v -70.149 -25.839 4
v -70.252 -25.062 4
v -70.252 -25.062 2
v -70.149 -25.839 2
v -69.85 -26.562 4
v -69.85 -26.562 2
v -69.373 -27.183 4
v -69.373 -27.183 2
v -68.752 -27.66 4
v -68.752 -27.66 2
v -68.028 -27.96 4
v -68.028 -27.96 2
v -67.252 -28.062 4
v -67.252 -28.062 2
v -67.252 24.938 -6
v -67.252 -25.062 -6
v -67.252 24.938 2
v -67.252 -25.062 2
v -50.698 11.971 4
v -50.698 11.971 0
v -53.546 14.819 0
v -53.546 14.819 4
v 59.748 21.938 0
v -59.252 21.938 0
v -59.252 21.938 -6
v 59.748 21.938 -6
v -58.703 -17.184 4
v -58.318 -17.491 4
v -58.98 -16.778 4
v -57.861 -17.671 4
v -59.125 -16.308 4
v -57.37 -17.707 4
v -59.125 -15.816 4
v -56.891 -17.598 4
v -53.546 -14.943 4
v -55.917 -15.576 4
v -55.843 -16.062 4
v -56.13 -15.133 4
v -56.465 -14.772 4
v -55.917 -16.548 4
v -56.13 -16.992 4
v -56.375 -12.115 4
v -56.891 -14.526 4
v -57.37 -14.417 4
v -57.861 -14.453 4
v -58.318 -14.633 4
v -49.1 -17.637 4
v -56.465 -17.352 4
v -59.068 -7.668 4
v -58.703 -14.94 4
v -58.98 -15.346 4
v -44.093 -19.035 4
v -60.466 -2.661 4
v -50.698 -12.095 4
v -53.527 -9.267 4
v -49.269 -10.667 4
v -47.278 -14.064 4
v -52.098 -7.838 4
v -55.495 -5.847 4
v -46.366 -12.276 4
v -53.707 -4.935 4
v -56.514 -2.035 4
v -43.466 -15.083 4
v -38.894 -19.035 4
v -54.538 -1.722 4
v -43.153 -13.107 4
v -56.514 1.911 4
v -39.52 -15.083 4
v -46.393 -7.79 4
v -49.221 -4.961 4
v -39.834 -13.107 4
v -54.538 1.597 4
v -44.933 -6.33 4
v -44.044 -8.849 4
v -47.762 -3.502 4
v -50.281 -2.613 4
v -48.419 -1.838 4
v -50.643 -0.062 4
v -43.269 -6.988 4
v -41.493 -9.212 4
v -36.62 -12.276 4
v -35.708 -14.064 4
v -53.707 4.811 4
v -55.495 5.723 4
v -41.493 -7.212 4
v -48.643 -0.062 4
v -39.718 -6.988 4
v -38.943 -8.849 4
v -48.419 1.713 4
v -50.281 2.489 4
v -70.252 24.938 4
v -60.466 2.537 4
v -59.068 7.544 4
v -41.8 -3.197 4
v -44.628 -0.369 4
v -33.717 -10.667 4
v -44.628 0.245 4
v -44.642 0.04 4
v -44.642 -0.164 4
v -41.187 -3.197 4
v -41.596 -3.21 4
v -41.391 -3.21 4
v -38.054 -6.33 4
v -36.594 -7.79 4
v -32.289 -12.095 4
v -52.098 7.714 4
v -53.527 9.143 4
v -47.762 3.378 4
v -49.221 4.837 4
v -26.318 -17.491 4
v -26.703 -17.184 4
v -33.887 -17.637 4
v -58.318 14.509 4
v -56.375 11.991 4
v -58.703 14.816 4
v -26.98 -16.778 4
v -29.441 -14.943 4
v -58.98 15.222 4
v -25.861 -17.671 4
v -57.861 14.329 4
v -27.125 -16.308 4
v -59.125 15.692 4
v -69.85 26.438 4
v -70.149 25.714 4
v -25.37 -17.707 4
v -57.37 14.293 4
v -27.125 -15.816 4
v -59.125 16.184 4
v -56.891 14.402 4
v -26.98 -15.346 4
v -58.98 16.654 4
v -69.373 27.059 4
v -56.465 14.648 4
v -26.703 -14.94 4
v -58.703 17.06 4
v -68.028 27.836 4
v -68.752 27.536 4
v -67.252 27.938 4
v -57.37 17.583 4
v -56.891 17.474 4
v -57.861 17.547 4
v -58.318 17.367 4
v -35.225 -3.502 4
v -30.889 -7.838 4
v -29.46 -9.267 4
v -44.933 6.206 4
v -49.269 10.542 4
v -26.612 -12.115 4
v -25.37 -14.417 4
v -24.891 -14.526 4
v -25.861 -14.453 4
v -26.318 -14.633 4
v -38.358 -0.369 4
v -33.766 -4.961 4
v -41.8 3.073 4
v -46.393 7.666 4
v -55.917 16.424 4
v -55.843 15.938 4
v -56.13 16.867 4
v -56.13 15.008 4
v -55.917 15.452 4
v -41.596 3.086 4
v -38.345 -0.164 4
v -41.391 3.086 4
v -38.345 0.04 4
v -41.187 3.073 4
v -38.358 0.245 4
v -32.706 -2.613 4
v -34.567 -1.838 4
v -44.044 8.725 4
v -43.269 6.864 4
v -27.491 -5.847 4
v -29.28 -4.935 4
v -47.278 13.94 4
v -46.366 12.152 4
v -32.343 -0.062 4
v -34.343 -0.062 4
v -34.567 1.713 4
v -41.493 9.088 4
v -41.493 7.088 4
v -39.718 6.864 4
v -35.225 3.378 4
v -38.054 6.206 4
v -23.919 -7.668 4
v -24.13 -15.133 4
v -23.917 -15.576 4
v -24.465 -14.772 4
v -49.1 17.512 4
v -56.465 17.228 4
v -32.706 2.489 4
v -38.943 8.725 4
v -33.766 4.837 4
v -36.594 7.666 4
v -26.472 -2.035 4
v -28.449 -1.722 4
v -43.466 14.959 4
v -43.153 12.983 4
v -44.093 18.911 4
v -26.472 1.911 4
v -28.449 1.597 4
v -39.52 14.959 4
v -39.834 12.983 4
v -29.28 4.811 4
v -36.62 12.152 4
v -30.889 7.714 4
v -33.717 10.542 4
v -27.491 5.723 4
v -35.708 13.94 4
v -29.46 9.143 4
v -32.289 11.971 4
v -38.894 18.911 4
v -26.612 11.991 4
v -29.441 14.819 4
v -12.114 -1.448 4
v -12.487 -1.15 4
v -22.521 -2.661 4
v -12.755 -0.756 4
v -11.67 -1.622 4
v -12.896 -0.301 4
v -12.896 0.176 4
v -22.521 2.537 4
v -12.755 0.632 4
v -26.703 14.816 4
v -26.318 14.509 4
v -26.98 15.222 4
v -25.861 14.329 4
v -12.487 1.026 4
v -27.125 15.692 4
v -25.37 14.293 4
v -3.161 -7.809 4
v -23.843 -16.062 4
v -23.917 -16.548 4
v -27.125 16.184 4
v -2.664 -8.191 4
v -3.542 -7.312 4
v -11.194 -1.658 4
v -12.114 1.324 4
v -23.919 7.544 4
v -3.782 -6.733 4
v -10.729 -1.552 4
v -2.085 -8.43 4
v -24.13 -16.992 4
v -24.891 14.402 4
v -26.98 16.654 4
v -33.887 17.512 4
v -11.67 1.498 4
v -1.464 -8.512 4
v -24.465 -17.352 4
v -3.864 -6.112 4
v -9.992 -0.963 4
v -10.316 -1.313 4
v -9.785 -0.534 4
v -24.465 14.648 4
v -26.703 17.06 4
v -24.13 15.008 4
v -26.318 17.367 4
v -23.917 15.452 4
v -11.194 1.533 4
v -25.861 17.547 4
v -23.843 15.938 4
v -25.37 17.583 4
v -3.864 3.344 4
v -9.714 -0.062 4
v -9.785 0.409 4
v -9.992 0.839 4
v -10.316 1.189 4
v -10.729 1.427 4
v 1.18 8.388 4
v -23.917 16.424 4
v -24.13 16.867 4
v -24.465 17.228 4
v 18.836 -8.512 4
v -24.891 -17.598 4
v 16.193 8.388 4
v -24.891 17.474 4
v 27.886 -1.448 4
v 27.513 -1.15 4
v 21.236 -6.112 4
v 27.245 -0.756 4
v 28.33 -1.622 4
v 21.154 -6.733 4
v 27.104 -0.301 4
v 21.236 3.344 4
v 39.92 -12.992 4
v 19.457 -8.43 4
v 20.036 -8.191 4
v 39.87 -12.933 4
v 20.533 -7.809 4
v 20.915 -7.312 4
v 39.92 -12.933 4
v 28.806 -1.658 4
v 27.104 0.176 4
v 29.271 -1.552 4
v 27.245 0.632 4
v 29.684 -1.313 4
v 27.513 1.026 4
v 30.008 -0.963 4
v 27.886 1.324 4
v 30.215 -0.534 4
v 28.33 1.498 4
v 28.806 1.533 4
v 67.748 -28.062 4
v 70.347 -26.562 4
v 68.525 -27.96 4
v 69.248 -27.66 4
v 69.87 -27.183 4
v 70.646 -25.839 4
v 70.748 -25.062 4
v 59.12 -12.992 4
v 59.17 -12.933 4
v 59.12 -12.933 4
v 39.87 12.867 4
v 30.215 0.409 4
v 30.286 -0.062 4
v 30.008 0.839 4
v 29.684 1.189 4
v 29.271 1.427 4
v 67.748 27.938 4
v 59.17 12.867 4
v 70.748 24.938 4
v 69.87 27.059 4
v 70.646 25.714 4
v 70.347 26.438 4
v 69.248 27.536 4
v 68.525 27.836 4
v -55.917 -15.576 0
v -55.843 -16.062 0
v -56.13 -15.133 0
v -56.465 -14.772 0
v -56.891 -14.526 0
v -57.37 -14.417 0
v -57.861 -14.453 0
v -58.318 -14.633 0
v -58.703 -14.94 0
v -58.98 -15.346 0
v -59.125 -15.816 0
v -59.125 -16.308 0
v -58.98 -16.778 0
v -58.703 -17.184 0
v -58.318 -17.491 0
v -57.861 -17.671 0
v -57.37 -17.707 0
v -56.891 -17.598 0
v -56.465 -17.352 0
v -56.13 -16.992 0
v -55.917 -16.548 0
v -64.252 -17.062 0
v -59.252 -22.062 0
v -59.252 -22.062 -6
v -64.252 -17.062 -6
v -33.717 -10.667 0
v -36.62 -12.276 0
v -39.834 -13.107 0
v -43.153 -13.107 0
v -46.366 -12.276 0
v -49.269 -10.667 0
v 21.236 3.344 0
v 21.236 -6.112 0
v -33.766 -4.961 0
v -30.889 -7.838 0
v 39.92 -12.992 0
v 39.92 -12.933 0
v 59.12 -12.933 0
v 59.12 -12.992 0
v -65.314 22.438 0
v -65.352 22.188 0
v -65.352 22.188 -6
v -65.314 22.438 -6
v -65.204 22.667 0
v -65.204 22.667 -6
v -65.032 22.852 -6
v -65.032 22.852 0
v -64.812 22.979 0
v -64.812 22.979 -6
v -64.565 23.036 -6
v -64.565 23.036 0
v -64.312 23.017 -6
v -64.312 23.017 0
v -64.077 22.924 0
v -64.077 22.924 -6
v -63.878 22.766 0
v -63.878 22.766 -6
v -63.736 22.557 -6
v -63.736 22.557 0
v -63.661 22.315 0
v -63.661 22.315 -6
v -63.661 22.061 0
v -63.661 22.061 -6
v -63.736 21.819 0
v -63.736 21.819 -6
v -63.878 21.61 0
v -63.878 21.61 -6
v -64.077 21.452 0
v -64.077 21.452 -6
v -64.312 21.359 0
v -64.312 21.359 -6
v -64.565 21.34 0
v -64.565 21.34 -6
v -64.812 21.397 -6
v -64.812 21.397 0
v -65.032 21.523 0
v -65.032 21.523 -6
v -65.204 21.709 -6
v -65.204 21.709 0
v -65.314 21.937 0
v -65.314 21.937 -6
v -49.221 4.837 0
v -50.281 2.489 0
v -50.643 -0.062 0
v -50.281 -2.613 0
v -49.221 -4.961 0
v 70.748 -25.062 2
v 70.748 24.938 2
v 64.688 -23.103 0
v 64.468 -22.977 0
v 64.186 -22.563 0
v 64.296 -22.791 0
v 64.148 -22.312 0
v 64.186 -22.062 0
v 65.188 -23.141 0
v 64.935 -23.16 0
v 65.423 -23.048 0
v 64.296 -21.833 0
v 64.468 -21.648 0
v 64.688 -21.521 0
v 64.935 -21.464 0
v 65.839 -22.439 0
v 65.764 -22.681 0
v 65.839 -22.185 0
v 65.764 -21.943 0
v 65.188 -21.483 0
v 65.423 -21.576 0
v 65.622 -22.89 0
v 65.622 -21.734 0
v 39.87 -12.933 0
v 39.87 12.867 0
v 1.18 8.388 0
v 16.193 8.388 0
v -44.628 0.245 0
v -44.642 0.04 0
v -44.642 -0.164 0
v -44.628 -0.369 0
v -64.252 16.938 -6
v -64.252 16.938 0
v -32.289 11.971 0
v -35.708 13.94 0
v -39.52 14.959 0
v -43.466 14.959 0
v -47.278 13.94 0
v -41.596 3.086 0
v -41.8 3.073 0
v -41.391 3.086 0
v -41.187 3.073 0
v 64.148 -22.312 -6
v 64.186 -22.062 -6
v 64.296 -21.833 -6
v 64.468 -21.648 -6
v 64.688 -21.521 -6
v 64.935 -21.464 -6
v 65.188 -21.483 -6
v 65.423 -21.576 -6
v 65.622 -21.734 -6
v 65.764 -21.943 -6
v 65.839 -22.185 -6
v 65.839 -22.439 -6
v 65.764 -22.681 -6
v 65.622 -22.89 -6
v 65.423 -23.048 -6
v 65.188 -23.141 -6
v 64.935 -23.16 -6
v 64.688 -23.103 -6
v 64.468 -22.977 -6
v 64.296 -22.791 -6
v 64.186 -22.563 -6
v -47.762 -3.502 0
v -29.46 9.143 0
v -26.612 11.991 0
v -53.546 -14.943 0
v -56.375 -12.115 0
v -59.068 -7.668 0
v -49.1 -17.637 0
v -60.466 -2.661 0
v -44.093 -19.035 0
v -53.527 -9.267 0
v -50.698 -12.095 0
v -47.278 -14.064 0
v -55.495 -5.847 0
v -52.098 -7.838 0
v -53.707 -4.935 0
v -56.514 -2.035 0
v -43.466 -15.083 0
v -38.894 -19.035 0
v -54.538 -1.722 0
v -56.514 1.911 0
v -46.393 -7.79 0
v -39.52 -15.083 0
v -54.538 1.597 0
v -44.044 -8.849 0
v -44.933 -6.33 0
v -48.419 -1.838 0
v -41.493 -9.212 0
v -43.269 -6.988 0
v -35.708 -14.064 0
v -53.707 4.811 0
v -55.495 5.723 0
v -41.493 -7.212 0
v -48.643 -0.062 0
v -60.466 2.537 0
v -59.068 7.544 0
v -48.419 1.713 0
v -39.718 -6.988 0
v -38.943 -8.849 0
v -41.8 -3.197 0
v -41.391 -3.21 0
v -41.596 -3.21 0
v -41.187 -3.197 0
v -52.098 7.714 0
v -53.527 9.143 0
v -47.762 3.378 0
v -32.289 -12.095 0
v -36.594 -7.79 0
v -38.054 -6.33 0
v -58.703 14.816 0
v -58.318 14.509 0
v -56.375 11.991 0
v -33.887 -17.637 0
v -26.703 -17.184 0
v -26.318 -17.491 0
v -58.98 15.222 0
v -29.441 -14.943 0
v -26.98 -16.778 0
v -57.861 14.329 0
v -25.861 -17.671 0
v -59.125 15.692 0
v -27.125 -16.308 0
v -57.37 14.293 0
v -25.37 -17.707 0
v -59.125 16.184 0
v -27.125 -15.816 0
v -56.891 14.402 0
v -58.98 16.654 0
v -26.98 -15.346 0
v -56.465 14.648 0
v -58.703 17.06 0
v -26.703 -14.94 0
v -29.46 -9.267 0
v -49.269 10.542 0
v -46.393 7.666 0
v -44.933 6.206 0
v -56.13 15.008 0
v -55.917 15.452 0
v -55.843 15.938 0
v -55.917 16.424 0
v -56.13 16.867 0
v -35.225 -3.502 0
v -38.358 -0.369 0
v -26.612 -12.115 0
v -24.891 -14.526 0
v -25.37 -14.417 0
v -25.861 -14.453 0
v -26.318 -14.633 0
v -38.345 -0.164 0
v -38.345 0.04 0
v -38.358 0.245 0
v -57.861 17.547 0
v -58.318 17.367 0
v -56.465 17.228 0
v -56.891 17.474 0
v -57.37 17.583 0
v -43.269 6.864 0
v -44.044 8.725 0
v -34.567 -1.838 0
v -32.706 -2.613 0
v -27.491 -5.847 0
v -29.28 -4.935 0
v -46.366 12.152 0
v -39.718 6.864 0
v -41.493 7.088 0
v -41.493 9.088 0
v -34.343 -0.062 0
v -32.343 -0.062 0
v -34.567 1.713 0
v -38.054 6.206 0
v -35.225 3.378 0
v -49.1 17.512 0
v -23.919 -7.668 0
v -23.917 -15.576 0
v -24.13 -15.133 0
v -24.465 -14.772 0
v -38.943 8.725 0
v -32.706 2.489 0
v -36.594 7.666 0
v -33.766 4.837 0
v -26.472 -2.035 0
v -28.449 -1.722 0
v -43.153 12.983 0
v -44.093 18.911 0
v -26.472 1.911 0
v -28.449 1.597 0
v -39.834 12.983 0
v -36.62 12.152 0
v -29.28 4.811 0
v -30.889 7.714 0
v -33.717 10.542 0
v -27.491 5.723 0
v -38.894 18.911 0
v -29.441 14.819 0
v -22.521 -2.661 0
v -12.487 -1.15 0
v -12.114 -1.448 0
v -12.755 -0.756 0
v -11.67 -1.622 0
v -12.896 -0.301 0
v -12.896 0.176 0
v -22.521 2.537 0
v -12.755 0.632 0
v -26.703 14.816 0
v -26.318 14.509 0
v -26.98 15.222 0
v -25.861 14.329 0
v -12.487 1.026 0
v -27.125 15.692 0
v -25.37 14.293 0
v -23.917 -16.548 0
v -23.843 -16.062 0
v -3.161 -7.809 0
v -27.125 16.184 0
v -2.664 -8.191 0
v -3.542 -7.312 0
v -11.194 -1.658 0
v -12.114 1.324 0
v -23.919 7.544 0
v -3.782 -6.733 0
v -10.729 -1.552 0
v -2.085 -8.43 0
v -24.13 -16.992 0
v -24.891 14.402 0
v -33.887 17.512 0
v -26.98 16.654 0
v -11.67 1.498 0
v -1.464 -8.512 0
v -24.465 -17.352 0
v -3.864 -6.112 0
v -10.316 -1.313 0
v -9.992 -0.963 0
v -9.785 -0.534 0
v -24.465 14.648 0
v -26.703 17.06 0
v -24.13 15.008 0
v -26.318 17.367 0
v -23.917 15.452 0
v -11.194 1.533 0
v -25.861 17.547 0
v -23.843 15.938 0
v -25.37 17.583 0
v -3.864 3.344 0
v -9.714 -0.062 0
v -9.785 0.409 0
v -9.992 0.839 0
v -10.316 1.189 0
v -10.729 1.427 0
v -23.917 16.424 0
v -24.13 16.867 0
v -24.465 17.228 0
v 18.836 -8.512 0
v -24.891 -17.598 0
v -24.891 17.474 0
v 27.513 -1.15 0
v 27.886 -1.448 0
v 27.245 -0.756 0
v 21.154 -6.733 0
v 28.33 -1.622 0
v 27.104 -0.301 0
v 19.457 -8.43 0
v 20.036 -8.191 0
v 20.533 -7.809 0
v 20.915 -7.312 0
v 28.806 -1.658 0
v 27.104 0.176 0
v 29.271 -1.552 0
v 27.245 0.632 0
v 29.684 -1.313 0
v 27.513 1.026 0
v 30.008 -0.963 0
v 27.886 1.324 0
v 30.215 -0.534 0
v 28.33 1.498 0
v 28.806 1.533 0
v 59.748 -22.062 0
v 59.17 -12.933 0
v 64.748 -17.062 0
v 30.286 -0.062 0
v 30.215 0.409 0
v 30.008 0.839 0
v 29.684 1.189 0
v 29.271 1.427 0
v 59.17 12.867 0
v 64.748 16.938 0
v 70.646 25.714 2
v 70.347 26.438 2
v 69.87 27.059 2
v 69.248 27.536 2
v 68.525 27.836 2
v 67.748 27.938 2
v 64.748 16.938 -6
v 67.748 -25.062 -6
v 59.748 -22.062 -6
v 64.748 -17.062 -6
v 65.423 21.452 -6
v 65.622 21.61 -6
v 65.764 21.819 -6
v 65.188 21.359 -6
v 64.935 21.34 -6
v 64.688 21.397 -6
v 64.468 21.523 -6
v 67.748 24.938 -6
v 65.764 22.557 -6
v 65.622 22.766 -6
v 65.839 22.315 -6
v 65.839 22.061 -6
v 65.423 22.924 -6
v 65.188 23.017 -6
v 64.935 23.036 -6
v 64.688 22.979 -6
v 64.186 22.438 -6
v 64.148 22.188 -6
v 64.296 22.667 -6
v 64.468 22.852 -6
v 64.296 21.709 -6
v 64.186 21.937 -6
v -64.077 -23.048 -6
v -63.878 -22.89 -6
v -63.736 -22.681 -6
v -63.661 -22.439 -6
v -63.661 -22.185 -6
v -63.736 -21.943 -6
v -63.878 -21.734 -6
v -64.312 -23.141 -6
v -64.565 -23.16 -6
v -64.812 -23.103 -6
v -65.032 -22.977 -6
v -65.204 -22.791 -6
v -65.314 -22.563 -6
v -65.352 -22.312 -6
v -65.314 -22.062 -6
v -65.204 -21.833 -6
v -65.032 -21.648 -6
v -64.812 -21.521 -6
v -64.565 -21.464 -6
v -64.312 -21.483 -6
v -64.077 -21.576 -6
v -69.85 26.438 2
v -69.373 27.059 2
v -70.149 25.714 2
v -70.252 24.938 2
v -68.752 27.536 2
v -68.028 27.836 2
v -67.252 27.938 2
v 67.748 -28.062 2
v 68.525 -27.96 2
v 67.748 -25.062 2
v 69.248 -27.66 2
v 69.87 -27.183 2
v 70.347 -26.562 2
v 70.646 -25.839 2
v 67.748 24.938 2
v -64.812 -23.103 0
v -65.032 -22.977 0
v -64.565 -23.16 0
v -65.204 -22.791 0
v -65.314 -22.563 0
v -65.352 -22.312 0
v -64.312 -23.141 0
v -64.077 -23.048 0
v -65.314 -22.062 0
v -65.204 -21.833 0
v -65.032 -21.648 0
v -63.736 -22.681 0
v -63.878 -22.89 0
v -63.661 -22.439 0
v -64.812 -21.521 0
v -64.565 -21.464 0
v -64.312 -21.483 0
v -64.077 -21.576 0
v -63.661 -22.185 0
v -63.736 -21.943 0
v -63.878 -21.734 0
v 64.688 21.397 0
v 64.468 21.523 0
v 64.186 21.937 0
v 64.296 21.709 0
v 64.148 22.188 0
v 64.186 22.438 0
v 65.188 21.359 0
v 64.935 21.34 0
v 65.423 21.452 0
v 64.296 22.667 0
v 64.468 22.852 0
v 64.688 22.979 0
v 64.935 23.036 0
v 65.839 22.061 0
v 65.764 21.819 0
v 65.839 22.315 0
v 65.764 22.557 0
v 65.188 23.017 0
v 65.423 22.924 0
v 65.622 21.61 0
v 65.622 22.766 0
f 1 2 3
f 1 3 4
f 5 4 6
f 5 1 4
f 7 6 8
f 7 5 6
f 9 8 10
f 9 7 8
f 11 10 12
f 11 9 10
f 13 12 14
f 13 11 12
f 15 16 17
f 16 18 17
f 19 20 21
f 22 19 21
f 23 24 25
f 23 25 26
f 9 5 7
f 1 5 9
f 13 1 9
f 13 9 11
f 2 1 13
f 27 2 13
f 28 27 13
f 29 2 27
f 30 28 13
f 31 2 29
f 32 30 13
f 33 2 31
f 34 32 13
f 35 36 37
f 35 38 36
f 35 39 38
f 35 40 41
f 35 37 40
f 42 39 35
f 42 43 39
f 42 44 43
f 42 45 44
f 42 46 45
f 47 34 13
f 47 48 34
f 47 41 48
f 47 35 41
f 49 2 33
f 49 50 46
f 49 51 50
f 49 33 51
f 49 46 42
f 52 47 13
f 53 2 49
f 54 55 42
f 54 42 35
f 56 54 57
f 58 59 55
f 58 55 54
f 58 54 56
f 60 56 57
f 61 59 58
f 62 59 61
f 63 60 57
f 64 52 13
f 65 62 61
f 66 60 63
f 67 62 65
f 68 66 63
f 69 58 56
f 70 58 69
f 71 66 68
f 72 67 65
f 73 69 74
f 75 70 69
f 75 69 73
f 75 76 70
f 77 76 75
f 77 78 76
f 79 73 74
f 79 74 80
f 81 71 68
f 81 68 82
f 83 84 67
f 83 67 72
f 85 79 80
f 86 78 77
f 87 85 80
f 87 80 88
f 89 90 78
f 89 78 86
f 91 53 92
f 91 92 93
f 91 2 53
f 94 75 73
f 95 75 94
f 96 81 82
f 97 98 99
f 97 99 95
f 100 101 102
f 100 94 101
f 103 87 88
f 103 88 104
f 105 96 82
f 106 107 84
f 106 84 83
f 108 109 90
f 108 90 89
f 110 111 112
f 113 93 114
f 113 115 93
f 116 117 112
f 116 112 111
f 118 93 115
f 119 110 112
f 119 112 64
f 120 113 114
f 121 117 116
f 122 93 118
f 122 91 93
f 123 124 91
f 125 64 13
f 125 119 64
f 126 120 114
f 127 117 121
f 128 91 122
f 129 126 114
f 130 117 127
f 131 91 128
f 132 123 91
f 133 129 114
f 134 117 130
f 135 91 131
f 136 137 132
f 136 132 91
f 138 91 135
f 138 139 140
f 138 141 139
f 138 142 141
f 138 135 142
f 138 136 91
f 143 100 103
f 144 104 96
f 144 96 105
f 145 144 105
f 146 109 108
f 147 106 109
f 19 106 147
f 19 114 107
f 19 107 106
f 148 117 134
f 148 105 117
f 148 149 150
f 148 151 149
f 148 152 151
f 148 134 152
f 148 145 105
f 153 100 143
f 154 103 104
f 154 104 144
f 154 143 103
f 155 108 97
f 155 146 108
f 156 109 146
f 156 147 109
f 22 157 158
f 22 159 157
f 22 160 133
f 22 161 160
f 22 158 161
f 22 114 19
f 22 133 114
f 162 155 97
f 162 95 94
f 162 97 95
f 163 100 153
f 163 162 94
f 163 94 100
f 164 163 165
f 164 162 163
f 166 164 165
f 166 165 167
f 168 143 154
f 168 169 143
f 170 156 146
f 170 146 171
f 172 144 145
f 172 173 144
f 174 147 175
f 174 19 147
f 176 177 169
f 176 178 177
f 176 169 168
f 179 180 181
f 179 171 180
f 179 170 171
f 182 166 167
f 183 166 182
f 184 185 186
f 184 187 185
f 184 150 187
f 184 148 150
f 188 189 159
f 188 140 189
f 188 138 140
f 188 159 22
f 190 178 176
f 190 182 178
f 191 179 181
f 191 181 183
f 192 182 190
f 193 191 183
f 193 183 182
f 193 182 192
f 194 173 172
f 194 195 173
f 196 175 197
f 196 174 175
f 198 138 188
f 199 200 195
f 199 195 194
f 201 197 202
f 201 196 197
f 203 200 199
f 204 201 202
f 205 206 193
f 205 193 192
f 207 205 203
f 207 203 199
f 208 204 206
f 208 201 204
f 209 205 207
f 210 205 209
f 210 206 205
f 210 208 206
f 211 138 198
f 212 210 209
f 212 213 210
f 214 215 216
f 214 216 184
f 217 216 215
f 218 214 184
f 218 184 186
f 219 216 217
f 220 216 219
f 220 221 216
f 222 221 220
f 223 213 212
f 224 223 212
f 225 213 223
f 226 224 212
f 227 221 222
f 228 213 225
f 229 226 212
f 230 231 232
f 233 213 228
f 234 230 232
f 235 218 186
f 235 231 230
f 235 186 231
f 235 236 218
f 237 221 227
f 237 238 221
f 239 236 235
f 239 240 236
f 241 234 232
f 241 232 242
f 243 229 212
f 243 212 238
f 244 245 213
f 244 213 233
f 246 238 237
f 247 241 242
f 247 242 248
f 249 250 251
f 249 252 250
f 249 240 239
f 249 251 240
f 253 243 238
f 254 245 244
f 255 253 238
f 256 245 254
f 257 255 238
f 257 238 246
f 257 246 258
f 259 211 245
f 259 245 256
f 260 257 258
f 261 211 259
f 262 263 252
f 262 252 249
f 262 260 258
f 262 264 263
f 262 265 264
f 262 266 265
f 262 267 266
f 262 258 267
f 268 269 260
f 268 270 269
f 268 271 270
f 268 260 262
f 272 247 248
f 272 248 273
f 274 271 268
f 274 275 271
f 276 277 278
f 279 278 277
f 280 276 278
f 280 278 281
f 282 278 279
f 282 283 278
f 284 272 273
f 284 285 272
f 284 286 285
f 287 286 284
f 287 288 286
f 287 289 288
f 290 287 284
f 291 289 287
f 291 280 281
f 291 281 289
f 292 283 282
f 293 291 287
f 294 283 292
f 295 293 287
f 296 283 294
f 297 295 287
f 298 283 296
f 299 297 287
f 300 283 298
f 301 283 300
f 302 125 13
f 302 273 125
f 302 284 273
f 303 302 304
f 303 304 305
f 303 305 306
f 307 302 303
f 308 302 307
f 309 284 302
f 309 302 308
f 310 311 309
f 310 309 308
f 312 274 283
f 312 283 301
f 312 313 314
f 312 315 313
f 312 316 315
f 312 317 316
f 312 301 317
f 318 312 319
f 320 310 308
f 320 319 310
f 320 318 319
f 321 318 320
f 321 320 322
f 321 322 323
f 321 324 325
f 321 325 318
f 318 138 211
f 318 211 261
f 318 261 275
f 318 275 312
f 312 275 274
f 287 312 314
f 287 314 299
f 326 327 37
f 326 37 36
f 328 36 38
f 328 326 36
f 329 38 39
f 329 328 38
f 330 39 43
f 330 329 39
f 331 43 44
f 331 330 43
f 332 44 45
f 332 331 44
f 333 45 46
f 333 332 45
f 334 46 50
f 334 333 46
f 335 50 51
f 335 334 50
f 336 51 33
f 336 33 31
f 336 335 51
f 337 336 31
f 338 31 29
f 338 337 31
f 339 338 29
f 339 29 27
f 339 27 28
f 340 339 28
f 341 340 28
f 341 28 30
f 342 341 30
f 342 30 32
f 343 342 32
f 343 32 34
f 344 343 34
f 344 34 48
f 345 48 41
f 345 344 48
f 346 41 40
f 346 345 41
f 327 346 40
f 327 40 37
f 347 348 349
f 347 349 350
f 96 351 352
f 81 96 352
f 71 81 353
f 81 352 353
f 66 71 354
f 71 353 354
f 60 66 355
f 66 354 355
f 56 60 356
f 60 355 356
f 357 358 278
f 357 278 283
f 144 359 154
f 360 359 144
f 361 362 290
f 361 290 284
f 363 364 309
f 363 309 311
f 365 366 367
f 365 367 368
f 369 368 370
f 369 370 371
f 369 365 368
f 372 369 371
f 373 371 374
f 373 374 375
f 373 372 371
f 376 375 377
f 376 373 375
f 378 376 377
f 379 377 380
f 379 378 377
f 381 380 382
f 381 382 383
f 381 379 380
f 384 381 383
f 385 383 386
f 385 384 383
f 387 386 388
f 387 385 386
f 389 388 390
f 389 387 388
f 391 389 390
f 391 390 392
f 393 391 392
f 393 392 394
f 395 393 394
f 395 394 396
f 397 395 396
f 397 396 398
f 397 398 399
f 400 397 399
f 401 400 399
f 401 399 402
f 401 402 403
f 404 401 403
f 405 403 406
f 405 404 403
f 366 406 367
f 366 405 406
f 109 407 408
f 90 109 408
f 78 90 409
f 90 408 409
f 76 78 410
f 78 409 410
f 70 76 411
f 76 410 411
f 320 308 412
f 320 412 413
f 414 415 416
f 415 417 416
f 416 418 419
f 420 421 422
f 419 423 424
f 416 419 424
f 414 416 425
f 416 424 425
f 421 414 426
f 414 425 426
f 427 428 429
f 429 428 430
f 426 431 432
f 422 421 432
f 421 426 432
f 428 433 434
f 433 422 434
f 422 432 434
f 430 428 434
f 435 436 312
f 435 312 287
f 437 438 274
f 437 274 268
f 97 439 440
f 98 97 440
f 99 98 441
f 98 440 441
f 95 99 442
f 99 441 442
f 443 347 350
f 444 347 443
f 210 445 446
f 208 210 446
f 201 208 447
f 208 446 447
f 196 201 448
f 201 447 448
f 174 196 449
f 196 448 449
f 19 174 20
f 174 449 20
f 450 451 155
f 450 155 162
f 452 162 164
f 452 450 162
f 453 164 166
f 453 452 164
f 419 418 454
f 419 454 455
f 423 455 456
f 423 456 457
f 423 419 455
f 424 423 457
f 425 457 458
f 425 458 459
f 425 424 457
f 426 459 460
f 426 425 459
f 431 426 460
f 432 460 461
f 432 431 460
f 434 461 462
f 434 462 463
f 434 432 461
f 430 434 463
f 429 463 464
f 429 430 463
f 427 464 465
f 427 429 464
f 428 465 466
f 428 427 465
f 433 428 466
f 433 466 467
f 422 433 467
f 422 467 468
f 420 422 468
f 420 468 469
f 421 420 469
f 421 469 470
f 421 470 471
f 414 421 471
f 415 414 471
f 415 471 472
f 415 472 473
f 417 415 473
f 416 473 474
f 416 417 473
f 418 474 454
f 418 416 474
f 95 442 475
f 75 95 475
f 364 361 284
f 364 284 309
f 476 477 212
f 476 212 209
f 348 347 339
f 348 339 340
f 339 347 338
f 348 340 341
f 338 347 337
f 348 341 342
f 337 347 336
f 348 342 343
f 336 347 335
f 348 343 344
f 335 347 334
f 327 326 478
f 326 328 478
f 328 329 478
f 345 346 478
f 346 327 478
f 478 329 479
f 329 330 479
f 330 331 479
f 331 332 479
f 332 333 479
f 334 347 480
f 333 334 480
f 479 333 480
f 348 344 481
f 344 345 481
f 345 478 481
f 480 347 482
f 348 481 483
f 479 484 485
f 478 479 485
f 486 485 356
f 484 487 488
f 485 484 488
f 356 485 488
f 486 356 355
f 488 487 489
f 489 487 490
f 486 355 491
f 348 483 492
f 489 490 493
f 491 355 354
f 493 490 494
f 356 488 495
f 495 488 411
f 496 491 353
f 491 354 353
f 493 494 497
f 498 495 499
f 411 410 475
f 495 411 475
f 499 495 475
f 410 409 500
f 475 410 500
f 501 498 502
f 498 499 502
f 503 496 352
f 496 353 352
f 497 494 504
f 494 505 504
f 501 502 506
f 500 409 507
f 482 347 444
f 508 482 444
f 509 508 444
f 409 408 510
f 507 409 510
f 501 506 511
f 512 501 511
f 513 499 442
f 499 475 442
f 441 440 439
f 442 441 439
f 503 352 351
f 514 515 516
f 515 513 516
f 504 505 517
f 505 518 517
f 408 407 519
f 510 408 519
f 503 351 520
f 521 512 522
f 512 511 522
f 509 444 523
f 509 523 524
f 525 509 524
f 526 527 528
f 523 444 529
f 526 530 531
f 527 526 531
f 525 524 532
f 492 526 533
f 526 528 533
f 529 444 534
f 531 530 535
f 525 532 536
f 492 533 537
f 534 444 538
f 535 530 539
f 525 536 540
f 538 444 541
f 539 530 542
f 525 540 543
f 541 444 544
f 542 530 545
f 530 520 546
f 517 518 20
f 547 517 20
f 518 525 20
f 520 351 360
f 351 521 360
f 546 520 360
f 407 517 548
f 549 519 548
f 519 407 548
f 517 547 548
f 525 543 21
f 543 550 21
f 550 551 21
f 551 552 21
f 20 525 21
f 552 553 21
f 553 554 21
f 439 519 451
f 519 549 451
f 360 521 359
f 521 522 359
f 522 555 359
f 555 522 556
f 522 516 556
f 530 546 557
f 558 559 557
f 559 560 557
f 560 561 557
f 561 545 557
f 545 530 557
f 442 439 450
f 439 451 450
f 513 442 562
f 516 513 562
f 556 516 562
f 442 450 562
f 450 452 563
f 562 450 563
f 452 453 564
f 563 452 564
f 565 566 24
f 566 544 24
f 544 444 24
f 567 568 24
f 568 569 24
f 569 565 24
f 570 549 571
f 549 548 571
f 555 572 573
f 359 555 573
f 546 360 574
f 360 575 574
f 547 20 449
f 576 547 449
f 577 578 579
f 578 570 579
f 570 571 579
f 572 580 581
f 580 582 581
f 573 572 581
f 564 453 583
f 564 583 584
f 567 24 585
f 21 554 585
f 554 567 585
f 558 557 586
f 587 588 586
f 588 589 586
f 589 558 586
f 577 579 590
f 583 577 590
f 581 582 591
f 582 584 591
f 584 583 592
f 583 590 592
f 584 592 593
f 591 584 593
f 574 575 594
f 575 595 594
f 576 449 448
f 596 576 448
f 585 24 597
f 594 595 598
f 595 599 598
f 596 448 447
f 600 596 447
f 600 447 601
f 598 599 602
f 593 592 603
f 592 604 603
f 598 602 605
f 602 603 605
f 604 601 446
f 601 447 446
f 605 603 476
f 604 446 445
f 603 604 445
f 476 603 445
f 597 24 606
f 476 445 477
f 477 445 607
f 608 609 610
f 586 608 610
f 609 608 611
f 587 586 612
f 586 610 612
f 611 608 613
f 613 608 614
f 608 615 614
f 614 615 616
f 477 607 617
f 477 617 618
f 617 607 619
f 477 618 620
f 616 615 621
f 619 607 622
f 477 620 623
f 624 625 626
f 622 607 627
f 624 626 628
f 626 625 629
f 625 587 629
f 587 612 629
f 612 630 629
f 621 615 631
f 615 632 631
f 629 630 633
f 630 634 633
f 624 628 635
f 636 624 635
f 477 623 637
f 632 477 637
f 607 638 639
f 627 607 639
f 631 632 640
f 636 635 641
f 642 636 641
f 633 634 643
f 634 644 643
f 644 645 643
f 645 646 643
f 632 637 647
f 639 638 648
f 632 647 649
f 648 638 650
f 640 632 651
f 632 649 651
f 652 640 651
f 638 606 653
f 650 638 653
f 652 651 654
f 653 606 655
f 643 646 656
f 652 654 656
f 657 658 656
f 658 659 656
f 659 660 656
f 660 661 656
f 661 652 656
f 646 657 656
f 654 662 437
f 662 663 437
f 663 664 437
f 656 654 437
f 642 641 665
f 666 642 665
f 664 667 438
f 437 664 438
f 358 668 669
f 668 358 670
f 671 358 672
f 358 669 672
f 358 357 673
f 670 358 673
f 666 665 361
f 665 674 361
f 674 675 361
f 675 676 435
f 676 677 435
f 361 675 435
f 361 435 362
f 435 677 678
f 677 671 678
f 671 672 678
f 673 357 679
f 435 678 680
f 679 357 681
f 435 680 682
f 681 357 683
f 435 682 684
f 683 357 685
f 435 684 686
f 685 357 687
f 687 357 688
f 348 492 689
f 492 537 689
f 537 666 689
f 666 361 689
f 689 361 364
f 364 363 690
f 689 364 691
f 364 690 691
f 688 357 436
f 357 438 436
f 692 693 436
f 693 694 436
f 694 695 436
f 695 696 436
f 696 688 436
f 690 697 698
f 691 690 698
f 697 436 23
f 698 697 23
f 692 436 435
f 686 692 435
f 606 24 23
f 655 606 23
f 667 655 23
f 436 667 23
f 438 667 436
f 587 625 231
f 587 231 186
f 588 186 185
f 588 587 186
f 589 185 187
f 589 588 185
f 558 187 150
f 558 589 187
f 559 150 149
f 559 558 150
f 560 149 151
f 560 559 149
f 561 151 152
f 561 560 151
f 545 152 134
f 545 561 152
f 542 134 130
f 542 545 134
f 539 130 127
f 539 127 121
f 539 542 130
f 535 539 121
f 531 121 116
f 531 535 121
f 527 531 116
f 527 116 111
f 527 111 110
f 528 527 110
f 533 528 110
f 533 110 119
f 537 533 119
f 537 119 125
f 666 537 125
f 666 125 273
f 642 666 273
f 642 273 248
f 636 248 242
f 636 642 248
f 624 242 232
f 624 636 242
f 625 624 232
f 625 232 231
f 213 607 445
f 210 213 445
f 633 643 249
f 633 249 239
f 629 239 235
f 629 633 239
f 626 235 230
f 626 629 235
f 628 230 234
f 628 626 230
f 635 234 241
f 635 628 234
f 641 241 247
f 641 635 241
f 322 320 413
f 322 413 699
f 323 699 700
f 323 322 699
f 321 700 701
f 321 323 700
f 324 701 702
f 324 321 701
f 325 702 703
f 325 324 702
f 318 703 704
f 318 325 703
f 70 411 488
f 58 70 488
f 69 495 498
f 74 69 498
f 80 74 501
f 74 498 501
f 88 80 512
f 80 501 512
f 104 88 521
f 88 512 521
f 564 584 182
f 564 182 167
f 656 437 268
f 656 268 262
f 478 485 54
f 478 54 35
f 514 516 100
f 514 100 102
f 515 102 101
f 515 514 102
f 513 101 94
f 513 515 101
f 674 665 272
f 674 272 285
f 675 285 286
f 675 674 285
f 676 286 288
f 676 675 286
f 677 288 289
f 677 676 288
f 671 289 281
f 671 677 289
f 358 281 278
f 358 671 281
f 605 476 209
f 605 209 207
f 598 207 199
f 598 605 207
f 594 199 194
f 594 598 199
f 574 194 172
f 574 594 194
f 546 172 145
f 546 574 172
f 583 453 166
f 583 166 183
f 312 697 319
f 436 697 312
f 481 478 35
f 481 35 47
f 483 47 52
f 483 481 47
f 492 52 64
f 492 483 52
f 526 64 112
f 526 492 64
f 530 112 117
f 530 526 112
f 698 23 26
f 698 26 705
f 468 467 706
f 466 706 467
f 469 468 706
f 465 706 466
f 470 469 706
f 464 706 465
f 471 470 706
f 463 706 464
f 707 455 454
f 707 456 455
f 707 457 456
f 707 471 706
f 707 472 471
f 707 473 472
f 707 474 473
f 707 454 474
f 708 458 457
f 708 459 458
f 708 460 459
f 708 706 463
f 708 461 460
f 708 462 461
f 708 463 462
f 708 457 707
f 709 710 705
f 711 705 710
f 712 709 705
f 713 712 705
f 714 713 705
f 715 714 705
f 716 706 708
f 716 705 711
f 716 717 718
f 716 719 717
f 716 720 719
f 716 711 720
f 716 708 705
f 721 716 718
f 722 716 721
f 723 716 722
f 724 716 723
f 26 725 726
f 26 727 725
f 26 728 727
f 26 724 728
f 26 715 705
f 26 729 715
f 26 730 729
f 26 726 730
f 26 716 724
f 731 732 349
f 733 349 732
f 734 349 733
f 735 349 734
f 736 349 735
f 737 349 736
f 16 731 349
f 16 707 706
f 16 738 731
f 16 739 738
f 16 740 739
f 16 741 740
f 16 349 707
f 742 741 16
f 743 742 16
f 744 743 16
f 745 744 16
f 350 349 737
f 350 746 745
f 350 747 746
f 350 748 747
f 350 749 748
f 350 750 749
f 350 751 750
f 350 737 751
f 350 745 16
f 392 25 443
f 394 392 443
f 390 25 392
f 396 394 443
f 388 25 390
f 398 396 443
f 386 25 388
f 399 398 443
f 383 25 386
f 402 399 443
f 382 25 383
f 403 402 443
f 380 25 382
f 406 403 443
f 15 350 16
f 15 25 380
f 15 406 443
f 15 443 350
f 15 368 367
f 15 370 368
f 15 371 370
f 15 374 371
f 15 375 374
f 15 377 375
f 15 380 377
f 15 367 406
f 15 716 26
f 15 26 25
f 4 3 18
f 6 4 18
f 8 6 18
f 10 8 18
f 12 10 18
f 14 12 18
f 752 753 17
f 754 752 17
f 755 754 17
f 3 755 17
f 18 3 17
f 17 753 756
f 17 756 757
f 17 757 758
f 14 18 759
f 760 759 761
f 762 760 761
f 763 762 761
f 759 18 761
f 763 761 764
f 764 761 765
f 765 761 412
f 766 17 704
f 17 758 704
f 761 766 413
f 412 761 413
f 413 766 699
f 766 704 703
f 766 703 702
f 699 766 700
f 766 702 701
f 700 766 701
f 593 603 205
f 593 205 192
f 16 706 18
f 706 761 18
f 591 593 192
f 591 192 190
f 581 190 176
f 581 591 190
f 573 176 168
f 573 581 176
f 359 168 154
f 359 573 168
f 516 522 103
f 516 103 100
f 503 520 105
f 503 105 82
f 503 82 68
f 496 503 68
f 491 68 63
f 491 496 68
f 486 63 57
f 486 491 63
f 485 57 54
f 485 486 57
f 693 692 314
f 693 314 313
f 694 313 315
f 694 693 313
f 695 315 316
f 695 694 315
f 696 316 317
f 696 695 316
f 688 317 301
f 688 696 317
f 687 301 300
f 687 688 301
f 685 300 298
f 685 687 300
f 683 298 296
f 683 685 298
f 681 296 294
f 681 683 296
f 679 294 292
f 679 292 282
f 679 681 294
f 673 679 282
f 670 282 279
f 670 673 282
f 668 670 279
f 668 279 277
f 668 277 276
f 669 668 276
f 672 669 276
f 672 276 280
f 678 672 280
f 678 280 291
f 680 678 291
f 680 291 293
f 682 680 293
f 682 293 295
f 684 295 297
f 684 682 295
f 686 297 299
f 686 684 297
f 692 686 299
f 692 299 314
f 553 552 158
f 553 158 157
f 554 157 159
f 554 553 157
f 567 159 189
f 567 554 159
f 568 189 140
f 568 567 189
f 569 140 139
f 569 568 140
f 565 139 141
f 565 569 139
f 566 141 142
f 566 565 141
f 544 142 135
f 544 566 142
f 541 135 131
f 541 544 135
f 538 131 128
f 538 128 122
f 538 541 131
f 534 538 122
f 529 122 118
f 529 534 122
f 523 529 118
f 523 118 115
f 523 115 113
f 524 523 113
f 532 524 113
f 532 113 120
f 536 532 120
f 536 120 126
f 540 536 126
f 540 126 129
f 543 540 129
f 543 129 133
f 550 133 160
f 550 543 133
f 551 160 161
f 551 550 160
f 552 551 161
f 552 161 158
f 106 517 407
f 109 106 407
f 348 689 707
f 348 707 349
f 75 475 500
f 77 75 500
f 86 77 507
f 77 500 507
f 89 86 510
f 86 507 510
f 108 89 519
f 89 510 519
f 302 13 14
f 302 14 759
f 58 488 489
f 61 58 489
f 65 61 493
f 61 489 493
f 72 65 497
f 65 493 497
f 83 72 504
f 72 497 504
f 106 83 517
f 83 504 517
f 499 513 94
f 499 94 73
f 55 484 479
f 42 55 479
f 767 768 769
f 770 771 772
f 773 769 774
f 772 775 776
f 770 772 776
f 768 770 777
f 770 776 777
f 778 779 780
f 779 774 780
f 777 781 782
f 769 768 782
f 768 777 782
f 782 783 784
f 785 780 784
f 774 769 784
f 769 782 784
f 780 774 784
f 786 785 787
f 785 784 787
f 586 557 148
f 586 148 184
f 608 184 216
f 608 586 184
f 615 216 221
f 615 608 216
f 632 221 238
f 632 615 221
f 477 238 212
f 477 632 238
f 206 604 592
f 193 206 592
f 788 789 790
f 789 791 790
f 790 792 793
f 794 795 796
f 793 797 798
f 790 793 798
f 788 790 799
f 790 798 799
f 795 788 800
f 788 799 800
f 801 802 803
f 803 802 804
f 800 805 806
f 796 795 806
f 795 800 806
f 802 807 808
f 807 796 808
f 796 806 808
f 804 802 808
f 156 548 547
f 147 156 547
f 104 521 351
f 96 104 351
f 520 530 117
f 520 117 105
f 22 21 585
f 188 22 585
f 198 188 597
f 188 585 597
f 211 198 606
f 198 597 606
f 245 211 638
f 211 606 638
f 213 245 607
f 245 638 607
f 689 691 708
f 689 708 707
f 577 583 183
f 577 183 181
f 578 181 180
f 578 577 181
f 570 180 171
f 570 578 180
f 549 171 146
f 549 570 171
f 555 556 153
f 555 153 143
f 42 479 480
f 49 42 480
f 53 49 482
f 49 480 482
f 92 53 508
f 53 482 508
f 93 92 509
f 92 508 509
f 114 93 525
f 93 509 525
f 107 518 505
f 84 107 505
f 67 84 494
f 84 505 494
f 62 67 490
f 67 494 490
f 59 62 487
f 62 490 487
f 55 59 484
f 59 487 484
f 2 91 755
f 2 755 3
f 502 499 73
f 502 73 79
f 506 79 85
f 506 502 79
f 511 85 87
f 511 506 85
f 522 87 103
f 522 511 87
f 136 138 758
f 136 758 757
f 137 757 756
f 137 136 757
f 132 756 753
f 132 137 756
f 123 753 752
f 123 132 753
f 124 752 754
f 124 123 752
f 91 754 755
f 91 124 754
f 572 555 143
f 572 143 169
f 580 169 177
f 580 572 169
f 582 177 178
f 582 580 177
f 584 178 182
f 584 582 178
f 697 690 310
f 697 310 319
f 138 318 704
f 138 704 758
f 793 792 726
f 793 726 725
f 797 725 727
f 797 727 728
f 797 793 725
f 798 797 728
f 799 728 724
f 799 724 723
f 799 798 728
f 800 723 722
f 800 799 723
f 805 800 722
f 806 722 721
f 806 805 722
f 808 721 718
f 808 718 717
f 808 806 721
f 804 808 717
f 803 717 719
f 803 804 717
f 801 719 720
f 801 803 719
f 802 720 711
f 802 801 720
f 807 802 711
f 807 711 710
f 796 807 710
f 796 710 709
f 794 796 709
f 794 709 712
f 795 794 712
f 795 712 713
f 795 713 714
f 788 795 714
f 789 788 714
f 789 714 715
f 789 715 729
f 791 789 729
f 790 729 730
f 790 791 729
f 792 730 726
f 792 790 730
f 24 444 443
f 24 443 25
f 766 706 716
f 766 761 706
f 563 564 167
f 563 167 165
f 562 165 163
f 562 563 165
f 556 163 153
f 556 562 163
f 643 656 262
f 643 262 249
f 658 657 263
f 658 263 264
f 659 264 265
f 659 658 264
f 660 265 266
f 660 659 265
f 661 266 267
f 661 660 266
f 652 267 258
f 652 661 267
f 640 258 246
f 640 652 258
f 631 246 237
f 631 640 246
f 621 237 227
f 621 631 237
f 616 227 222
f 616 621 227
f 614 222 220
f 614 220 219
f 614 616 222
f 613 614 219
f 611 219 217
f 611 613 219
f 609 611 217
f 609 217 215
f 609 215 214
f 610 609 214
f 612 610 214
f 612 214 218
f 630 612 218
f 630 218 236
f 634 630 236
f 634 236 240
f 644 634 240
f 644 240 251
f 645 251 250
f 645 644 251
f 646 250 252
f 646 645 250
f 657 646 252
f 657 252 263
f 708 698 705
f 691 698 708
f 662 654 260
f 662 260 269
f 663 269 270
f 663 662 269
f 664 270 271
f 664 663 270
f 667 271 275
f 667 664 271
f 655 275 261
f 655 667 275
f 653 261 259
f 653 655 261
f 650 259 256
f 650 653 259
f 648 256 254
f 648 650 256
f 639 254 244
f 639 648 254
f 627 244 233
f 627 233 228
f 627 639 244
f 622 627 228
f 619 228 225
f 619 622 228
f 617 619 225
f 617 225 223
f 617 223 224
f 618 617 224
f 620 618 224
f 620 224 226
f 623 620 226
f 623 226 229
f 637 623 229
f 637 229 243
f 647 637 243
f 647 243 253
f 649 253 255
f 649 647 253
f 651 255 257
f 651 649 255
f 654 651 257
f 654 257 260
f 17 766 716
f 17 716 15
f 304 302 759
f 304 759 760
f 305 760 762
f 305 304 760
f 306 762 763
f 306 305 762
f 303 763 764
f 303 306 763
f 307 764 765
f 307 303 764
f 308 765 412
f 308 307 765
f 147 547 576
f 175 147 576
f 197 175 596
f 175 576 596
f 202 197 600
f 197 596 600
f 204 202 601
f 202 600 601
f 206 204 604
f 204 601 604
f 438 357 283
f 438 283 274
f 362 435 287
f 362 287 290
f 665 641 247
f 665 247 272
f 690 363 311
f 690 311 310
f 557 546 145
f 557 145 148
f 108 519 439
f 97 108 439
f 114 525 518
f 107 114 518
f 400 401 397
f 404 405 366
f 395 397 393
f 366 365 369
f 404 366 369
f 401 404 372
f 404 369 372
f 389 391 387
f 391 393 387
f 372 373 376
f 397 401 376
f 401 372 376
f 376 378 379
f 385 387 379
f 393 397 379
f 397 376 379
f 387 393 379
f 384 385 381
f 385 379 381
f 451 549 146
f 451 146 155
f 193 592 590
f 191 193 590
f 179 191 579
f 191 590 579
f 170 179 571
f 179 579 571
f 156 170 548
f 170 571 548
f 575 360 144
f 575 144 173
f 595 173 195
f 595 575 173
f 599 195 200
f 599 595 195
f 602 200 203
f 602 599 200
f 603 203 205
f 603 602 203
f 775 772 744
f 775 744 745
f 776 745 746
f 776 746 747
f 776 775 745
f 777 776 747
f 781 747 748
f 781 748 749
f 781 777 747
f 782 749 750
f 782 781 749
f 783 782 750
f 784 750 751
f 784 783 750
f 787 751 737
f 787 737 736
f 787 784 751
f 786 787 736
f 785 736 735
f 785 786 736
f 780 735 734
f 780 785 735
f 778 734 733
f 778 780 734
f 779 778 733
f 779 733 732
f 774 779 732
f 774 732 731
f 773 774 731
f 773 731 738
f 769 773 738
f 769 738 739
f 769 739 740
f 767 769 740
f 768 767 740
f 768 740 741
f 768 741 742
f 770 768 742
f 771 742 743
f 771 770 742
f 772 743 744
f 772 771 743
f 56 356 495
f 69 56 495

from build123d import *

# Parameters (mm, degrees)
CROQUIS1_W              = 135
CROQUIS1_H              = 50
CROQUIS1_R              = 1.65
CROQUIS1_R_2            = 1.6
SALIENTE_EXTRUIR1_DEPTH = 4
CROQUIS2_W              = 135
CROQUIS2_H              = 50
SALIENTE_EXTRUIR2_DEPTH = 2
CROQUIS3_W              = 135
CROQUIS3_H              = 50
CROQUIS3_R              = 0.85
SALIENTE_EXTRUIR3_DEPTH = 6


with BuildPart() as part:
    # Croquis1 → Saliente-Extruir1 (new body)
    with BuildSketch(Plane.XY):
        with Locations((0.24843477, -0.062108693)):
            Rectangle(CROQUIS1_W, CROQUIS1_H)
        with Locations((-57.493419725, 15.937891307)):
            Circle(CROQUIS1_R, mode=Mode.SUBTRACT)
        with Locations((-25.493419725, 15.937891307)):
            Circle(CROQUIS1_R, mode=Mode.SUBTRACT)
        with Locations((-25.493419725, -16.062108693)):
            Circle(CROQUIS1_R, mode=Mode.SUBTRACT)
        with Locations((-57.493419725, -16.062108693)):
            Circle(CROQUIS1_R, mode=Mode.SUBTRACT)
        with Locations((28.686131392, -0.062108693)):
            Circle(CROQUIS1_R_2, mode=Mode.SUBTRACT)
        with Locations((-11.313868608, -0.062108693)):
            Circle(CROQUIS1_R_2, mode=Mode.SUBTRACT)
        Polygon((59.170162083, 12.86736071), (39.870162083, 12.86736071), (39.870162083, -12.93263929), (39.920162083, -12.93263929), (39.920162083, -12.991578095), (59.120162083, -12.991578095), (59.120162083, -12.93263929), (59.170162083, -12.93263929), align=None, mode=Mode.SUBTRACT)
        with BuildLine():
            Line((16.192628508, 8.387891307), (1.179634277, 8.387891307))
            Line((1.179634277, 8.387891307), (-3.863868608, 3.344388423))
            Line((-3.863868608, 3.344388423), (-3.863868608, -6.112108693))
            ThreePointArc((-3.863868608, -6.112108693), (-3.160924883, -7.809164967), (-1.463868608, -8.512108693))
            Line((-1.463868608, -8.512108693), (18.836131392, -8.512108693))
            ThreePointArc((18.836131392, -8.512108693), (20.533187667, -7.809164967), (21.236131392, -6.112108693))
            Line((21.236131392, -6.112108693), (21.236131392, 3.344388423))
            Line((21.236131392, 3.344388423), (16.192628508, 8.387891307))
        make_face(mode=Mode.SUBTRACT)
        with BuildLine():
            Line((-38.358377873, -0.368723419), (-35.225212961, -3.501888332))
            ThreePointArc((-35.225212961, -3.501888332), (-34.343419725, -0.062108693), (-35.225212961, 3.377670947))
            Line((-35.225212961, 3.377670947), (-38.358377873, 0.244506034))
            ThreePointArc((-38.358377873, 0.244506034), (-38.343419725, -0.062108693), (-38.358377873, -0.368723419))
        make_face(mode=Mode.SUBTRACT)
        with BuildLine():
            Line((-44.628461576, -0.368723419), (-47.761626488, -3.501888332))
            ThreePointArc((-47.761626488, -3.501888332), (-48.643419725, -0.062108693), (-47.761626488, 3.377670947))
            Line((-47.761626488, 3.377670947), (-44.628461576, 0.244506034))
            ThreePointArc((-44.628461576, 0.244506034), (-44.643419725, -0.062108693), (-44.628461576, -0.368723419))
        make_face(mode=Mode.SUBTRACT)
        with BuildLine():
            Line((-29.440590182, 14.819147975), (-32.288723267, 11.971014889))
            ThreePointArc((-32.288723267, 11.971014889), (-41.493419725, 15.087891307), (-50.698116182, 11.971014889))
            Line((-50.698116182, 11.971014889), (-53.546249267, 14.819147975))
            ThreePointArc((-53.546249267, 14.819147975), (-41.493419725, 19.087891307), (-29.440590182, 14.819147975))
        make_face(mode=Mode.SUBTRACT)
        with BuildLine():
            Line((-26.612163057, 11.99072085), (-29.460296143, 9.142587764))
            ThreePointArc((-29.460296143, 9.142587764), (-26.343419725, -0.062108693), (-29.460296143, -9.26680515))
            Line((-29.460296143, -9.26680515), (-26.612163057, -12.114938235))
            ThreePointArc((-26.612163057, -12.114938235), (-22.343419725, -0.062108693), (-26.612163057, 11.99072085))
        make_face(mode=Mode.SUBTRACT)
        with BuildLine():
            Line((-56.374676392, 11.99072085), (-53.526543306, 9.142587764))
            ThreePointArc((-53.526543306, 9.142587764), (-56.643419725, -0.062108693), (-53.526543306, -9.26680515))
            Line((-53.526543306, -9.26680515), (-56.374676392, -12.114938235))
            ThreePointArc((-56.374676392, -12.114938235), (-60.643419725, -0.062108693), (-56.374676392, 11.99072085))
        make_face(mode=Mode.SUBTRACT)
        with BuildLine():
            Line((-41.800034451, -3.197150544), (-44.933199364, -6.330315456))
            ThreePointArc((-44.933199364, -6.330315456), (-41.493419725, -7.212108693), (-38.053640085, -6.330315456))
            Line((-38.053640085, -6.330315456), (-41.186804998, -3.197150544))
            ThreePointArc((-41.186804998, -3.197150544), (-41.493419725, -3.212108693), (-41.800034451, -3.197150544))
        make_face(mode=Mode.SUBTRACT)
        with BuildLine():
            Line((-30.888925971, 7.713957937), (-33.765629521, 4.837254386))
            ThreePointArc((-33.765629521, 4.837254386), (-32.343419725, -0.062108693), (-33.765629521, -4.961471771))
            Line((-33.765629521, -4.961471771), (-30.888925971, -7.838175322))
            ThreePointArc((-30.888925971, -7.838175322), (-28.343419725, -0.062108693), (-30.888925971, 7.713957937))
        make_face(mode=Mode.SUBTRACT)
        with BuildLine():
            Line((-33.717353095, 10.542385061), (-36.594056646, 7.665681511))
            ThreePointArc((-36.594056646, 7.665681511), (-41.493419725, 9.087891307), (-46.392782803, 7.665681511))
            Line((-46.392782803, 7.665681511), (-49.269486354, 10.542385061))
            ThreePointArc((-49.269486354, 10.542385061), (-41.493419725, 13.087891307), (-33.717353095, 10.542385061))
        make_face(mode=Mode.SUBTRACT)
        with BuildLine():
            Line((-52.097913478, 7.713957937), (-49.221209928, 4.837254386))
            ThreePointArc((-49.221209928, 4.837254386), (-50.643419725, -0.062108693), (-49.221209928, -4.961471771))
            Line((-49.221209928, -4.961471771), (-52.097913478, -7.838175322))
            ThreePointArc((-52.097913478, -7.838175322), (-54.643419725, -0.062108693), (-52.097913478, 7.713957937))
        make_face(mode=Mode.SUBTRACT)
        with BuildLine():
            Line((-50.698116182, -12.095232274), (-53.546249267, -14.94336536))
            ThreePointArc((-53.546249267, -14.94336536), (-41.493419725, -19.212108693), (-29.440590182, -14.94336536))
            Line((-29.440590182, -14.94336536), (-32.288723267, -12.095232274))
            ThreePointArc((-32.288723267, -12.095232274), (-41.493419725, -15.212108693), (-50.698116182, -12.095232274))
        make_face(mode=Mode.SUBTRACT)
        with BuildLine():
            Line((-36.594056646, -7.789898896), (-33.717353095, -10.666602447))
            ThreePointArc((-33.717353095, -10.666602447), (-41.493419725, -13.212108693), (-49.269486354, -10.666602447))
            Line((-49.269486354, -10.666602447), (-46.392782803, -7.789898896))
            ThreePointArc((-46.392782803, -7.789898896), (-41.493419725, -9.212108693), (-36.594056646, -7.789898896))
        make_face(mode=Mode.SUBTRACT)
        with BuildLine():
            Line((-44.933199364, 6.206098071), (-41.800034451, 3.072933159))
            ThreePointArc((-41.800034451, 3.072933159), (-41.493419725, 3.087891307), (-41.186804998, 3.072933159))
            Line((-41.186804998, 3.072933159), (-38.053640085, 6.206098071))
            ThreePointArc((-38.053640085, 6.206098071), (-41.493419725, 7.087891307), (-44.933199364, 6.206098071))
        make_face(mode=Mode.SUBTRACT)
    extrude(amount=SALIENTE_EXTRUIR1_DEPTH)

    # Croquis2 → Saliente-Extruir2 (add)
    with BuildSketch(Plane.XY.offset(4)):
        with BuildLine():
            Line((70.74843477, -25.062108693), (70.74843477, 24.937891307))
            ThreePointArc((70.74843477, 24.937891307), (69.869755114, 27.059211651), (67.74843477, 27.937891307))
            Line((67.74843477, 27.937891307), (-67.25156523, 27.937891307))
            ThreePointArc((-67.25156523, 27.937891307), (-69.372885573, 27.059211651), (-70.25156523, 24.937891307))
            Line((-70.25156523, 24.937891307), (-70.25156523, -25.062108693))
            ThreePointArc((-70.25156523, -25.062108693), (-69.372885573, -27.183429036), (-67.25156523, -28.062108693))
            Line((-67.25156523, -28.062108693), (67.74843477, -28.062108693))
            ThreePointArc((67.74843477, -28.062108693), (69.869755114, -27.183429036), (70.74843477, -25.062108693))
        make_face()
        with Locations((0.24843477, -0.062108693)):
            Rectangle(CROQUIS2_W, CROQUIS2_H, mode=Mode.SUBTRACT)
    extrude(amount=-SALIENTE_EXTRUIR2_DEPTH)

    # Croquis3 → Saliente-Extruir3 (add)
    with BuildSketch(Plane(origin=(0, 0, 0), x_dir=(-1, 0, 0), z_dir=(0, 0, -1))):
        with Locations((-0.24843477, -0.062108693)):
            Rectangle(CROQUIS3_W, CROQUIS3_H)
        with Locations((-64.99843477, 22.187891307)):
            Circle(CROQUIS3_R, mode=Mode.SUBTRACT)
        with Locations((64.50156523, 22.187891307)):
            Circle(CROQUIS3_R, mode=Mode.SUBTRACT)
        with Locations((-64.99843477, -22.312108693)):
            Circle(CROQUIS3_R, mode=Mode.SUBTRACT)
        with Locations((64.50156523, -22.312108693)):
            Circle(CROQUIS3_R, mode=Mode.SUBTRACT)
        Polygon((-64.74843477, 16.937891307), (-64.74843477, -17.062108693), (-59.74843477, -22.062108693), (59.25156523, -22.062108693), (64.25156523, -17.062108693), (64.25156523, 16.937891307), (59.25156523, 21.937891307), (-59.74843477, 21.937891307), align=None, mode=Mode.SUBTRACT)
    extrude(amount=SALIENTE_EXTRUIR3_DEPTH)


solid = part.part
